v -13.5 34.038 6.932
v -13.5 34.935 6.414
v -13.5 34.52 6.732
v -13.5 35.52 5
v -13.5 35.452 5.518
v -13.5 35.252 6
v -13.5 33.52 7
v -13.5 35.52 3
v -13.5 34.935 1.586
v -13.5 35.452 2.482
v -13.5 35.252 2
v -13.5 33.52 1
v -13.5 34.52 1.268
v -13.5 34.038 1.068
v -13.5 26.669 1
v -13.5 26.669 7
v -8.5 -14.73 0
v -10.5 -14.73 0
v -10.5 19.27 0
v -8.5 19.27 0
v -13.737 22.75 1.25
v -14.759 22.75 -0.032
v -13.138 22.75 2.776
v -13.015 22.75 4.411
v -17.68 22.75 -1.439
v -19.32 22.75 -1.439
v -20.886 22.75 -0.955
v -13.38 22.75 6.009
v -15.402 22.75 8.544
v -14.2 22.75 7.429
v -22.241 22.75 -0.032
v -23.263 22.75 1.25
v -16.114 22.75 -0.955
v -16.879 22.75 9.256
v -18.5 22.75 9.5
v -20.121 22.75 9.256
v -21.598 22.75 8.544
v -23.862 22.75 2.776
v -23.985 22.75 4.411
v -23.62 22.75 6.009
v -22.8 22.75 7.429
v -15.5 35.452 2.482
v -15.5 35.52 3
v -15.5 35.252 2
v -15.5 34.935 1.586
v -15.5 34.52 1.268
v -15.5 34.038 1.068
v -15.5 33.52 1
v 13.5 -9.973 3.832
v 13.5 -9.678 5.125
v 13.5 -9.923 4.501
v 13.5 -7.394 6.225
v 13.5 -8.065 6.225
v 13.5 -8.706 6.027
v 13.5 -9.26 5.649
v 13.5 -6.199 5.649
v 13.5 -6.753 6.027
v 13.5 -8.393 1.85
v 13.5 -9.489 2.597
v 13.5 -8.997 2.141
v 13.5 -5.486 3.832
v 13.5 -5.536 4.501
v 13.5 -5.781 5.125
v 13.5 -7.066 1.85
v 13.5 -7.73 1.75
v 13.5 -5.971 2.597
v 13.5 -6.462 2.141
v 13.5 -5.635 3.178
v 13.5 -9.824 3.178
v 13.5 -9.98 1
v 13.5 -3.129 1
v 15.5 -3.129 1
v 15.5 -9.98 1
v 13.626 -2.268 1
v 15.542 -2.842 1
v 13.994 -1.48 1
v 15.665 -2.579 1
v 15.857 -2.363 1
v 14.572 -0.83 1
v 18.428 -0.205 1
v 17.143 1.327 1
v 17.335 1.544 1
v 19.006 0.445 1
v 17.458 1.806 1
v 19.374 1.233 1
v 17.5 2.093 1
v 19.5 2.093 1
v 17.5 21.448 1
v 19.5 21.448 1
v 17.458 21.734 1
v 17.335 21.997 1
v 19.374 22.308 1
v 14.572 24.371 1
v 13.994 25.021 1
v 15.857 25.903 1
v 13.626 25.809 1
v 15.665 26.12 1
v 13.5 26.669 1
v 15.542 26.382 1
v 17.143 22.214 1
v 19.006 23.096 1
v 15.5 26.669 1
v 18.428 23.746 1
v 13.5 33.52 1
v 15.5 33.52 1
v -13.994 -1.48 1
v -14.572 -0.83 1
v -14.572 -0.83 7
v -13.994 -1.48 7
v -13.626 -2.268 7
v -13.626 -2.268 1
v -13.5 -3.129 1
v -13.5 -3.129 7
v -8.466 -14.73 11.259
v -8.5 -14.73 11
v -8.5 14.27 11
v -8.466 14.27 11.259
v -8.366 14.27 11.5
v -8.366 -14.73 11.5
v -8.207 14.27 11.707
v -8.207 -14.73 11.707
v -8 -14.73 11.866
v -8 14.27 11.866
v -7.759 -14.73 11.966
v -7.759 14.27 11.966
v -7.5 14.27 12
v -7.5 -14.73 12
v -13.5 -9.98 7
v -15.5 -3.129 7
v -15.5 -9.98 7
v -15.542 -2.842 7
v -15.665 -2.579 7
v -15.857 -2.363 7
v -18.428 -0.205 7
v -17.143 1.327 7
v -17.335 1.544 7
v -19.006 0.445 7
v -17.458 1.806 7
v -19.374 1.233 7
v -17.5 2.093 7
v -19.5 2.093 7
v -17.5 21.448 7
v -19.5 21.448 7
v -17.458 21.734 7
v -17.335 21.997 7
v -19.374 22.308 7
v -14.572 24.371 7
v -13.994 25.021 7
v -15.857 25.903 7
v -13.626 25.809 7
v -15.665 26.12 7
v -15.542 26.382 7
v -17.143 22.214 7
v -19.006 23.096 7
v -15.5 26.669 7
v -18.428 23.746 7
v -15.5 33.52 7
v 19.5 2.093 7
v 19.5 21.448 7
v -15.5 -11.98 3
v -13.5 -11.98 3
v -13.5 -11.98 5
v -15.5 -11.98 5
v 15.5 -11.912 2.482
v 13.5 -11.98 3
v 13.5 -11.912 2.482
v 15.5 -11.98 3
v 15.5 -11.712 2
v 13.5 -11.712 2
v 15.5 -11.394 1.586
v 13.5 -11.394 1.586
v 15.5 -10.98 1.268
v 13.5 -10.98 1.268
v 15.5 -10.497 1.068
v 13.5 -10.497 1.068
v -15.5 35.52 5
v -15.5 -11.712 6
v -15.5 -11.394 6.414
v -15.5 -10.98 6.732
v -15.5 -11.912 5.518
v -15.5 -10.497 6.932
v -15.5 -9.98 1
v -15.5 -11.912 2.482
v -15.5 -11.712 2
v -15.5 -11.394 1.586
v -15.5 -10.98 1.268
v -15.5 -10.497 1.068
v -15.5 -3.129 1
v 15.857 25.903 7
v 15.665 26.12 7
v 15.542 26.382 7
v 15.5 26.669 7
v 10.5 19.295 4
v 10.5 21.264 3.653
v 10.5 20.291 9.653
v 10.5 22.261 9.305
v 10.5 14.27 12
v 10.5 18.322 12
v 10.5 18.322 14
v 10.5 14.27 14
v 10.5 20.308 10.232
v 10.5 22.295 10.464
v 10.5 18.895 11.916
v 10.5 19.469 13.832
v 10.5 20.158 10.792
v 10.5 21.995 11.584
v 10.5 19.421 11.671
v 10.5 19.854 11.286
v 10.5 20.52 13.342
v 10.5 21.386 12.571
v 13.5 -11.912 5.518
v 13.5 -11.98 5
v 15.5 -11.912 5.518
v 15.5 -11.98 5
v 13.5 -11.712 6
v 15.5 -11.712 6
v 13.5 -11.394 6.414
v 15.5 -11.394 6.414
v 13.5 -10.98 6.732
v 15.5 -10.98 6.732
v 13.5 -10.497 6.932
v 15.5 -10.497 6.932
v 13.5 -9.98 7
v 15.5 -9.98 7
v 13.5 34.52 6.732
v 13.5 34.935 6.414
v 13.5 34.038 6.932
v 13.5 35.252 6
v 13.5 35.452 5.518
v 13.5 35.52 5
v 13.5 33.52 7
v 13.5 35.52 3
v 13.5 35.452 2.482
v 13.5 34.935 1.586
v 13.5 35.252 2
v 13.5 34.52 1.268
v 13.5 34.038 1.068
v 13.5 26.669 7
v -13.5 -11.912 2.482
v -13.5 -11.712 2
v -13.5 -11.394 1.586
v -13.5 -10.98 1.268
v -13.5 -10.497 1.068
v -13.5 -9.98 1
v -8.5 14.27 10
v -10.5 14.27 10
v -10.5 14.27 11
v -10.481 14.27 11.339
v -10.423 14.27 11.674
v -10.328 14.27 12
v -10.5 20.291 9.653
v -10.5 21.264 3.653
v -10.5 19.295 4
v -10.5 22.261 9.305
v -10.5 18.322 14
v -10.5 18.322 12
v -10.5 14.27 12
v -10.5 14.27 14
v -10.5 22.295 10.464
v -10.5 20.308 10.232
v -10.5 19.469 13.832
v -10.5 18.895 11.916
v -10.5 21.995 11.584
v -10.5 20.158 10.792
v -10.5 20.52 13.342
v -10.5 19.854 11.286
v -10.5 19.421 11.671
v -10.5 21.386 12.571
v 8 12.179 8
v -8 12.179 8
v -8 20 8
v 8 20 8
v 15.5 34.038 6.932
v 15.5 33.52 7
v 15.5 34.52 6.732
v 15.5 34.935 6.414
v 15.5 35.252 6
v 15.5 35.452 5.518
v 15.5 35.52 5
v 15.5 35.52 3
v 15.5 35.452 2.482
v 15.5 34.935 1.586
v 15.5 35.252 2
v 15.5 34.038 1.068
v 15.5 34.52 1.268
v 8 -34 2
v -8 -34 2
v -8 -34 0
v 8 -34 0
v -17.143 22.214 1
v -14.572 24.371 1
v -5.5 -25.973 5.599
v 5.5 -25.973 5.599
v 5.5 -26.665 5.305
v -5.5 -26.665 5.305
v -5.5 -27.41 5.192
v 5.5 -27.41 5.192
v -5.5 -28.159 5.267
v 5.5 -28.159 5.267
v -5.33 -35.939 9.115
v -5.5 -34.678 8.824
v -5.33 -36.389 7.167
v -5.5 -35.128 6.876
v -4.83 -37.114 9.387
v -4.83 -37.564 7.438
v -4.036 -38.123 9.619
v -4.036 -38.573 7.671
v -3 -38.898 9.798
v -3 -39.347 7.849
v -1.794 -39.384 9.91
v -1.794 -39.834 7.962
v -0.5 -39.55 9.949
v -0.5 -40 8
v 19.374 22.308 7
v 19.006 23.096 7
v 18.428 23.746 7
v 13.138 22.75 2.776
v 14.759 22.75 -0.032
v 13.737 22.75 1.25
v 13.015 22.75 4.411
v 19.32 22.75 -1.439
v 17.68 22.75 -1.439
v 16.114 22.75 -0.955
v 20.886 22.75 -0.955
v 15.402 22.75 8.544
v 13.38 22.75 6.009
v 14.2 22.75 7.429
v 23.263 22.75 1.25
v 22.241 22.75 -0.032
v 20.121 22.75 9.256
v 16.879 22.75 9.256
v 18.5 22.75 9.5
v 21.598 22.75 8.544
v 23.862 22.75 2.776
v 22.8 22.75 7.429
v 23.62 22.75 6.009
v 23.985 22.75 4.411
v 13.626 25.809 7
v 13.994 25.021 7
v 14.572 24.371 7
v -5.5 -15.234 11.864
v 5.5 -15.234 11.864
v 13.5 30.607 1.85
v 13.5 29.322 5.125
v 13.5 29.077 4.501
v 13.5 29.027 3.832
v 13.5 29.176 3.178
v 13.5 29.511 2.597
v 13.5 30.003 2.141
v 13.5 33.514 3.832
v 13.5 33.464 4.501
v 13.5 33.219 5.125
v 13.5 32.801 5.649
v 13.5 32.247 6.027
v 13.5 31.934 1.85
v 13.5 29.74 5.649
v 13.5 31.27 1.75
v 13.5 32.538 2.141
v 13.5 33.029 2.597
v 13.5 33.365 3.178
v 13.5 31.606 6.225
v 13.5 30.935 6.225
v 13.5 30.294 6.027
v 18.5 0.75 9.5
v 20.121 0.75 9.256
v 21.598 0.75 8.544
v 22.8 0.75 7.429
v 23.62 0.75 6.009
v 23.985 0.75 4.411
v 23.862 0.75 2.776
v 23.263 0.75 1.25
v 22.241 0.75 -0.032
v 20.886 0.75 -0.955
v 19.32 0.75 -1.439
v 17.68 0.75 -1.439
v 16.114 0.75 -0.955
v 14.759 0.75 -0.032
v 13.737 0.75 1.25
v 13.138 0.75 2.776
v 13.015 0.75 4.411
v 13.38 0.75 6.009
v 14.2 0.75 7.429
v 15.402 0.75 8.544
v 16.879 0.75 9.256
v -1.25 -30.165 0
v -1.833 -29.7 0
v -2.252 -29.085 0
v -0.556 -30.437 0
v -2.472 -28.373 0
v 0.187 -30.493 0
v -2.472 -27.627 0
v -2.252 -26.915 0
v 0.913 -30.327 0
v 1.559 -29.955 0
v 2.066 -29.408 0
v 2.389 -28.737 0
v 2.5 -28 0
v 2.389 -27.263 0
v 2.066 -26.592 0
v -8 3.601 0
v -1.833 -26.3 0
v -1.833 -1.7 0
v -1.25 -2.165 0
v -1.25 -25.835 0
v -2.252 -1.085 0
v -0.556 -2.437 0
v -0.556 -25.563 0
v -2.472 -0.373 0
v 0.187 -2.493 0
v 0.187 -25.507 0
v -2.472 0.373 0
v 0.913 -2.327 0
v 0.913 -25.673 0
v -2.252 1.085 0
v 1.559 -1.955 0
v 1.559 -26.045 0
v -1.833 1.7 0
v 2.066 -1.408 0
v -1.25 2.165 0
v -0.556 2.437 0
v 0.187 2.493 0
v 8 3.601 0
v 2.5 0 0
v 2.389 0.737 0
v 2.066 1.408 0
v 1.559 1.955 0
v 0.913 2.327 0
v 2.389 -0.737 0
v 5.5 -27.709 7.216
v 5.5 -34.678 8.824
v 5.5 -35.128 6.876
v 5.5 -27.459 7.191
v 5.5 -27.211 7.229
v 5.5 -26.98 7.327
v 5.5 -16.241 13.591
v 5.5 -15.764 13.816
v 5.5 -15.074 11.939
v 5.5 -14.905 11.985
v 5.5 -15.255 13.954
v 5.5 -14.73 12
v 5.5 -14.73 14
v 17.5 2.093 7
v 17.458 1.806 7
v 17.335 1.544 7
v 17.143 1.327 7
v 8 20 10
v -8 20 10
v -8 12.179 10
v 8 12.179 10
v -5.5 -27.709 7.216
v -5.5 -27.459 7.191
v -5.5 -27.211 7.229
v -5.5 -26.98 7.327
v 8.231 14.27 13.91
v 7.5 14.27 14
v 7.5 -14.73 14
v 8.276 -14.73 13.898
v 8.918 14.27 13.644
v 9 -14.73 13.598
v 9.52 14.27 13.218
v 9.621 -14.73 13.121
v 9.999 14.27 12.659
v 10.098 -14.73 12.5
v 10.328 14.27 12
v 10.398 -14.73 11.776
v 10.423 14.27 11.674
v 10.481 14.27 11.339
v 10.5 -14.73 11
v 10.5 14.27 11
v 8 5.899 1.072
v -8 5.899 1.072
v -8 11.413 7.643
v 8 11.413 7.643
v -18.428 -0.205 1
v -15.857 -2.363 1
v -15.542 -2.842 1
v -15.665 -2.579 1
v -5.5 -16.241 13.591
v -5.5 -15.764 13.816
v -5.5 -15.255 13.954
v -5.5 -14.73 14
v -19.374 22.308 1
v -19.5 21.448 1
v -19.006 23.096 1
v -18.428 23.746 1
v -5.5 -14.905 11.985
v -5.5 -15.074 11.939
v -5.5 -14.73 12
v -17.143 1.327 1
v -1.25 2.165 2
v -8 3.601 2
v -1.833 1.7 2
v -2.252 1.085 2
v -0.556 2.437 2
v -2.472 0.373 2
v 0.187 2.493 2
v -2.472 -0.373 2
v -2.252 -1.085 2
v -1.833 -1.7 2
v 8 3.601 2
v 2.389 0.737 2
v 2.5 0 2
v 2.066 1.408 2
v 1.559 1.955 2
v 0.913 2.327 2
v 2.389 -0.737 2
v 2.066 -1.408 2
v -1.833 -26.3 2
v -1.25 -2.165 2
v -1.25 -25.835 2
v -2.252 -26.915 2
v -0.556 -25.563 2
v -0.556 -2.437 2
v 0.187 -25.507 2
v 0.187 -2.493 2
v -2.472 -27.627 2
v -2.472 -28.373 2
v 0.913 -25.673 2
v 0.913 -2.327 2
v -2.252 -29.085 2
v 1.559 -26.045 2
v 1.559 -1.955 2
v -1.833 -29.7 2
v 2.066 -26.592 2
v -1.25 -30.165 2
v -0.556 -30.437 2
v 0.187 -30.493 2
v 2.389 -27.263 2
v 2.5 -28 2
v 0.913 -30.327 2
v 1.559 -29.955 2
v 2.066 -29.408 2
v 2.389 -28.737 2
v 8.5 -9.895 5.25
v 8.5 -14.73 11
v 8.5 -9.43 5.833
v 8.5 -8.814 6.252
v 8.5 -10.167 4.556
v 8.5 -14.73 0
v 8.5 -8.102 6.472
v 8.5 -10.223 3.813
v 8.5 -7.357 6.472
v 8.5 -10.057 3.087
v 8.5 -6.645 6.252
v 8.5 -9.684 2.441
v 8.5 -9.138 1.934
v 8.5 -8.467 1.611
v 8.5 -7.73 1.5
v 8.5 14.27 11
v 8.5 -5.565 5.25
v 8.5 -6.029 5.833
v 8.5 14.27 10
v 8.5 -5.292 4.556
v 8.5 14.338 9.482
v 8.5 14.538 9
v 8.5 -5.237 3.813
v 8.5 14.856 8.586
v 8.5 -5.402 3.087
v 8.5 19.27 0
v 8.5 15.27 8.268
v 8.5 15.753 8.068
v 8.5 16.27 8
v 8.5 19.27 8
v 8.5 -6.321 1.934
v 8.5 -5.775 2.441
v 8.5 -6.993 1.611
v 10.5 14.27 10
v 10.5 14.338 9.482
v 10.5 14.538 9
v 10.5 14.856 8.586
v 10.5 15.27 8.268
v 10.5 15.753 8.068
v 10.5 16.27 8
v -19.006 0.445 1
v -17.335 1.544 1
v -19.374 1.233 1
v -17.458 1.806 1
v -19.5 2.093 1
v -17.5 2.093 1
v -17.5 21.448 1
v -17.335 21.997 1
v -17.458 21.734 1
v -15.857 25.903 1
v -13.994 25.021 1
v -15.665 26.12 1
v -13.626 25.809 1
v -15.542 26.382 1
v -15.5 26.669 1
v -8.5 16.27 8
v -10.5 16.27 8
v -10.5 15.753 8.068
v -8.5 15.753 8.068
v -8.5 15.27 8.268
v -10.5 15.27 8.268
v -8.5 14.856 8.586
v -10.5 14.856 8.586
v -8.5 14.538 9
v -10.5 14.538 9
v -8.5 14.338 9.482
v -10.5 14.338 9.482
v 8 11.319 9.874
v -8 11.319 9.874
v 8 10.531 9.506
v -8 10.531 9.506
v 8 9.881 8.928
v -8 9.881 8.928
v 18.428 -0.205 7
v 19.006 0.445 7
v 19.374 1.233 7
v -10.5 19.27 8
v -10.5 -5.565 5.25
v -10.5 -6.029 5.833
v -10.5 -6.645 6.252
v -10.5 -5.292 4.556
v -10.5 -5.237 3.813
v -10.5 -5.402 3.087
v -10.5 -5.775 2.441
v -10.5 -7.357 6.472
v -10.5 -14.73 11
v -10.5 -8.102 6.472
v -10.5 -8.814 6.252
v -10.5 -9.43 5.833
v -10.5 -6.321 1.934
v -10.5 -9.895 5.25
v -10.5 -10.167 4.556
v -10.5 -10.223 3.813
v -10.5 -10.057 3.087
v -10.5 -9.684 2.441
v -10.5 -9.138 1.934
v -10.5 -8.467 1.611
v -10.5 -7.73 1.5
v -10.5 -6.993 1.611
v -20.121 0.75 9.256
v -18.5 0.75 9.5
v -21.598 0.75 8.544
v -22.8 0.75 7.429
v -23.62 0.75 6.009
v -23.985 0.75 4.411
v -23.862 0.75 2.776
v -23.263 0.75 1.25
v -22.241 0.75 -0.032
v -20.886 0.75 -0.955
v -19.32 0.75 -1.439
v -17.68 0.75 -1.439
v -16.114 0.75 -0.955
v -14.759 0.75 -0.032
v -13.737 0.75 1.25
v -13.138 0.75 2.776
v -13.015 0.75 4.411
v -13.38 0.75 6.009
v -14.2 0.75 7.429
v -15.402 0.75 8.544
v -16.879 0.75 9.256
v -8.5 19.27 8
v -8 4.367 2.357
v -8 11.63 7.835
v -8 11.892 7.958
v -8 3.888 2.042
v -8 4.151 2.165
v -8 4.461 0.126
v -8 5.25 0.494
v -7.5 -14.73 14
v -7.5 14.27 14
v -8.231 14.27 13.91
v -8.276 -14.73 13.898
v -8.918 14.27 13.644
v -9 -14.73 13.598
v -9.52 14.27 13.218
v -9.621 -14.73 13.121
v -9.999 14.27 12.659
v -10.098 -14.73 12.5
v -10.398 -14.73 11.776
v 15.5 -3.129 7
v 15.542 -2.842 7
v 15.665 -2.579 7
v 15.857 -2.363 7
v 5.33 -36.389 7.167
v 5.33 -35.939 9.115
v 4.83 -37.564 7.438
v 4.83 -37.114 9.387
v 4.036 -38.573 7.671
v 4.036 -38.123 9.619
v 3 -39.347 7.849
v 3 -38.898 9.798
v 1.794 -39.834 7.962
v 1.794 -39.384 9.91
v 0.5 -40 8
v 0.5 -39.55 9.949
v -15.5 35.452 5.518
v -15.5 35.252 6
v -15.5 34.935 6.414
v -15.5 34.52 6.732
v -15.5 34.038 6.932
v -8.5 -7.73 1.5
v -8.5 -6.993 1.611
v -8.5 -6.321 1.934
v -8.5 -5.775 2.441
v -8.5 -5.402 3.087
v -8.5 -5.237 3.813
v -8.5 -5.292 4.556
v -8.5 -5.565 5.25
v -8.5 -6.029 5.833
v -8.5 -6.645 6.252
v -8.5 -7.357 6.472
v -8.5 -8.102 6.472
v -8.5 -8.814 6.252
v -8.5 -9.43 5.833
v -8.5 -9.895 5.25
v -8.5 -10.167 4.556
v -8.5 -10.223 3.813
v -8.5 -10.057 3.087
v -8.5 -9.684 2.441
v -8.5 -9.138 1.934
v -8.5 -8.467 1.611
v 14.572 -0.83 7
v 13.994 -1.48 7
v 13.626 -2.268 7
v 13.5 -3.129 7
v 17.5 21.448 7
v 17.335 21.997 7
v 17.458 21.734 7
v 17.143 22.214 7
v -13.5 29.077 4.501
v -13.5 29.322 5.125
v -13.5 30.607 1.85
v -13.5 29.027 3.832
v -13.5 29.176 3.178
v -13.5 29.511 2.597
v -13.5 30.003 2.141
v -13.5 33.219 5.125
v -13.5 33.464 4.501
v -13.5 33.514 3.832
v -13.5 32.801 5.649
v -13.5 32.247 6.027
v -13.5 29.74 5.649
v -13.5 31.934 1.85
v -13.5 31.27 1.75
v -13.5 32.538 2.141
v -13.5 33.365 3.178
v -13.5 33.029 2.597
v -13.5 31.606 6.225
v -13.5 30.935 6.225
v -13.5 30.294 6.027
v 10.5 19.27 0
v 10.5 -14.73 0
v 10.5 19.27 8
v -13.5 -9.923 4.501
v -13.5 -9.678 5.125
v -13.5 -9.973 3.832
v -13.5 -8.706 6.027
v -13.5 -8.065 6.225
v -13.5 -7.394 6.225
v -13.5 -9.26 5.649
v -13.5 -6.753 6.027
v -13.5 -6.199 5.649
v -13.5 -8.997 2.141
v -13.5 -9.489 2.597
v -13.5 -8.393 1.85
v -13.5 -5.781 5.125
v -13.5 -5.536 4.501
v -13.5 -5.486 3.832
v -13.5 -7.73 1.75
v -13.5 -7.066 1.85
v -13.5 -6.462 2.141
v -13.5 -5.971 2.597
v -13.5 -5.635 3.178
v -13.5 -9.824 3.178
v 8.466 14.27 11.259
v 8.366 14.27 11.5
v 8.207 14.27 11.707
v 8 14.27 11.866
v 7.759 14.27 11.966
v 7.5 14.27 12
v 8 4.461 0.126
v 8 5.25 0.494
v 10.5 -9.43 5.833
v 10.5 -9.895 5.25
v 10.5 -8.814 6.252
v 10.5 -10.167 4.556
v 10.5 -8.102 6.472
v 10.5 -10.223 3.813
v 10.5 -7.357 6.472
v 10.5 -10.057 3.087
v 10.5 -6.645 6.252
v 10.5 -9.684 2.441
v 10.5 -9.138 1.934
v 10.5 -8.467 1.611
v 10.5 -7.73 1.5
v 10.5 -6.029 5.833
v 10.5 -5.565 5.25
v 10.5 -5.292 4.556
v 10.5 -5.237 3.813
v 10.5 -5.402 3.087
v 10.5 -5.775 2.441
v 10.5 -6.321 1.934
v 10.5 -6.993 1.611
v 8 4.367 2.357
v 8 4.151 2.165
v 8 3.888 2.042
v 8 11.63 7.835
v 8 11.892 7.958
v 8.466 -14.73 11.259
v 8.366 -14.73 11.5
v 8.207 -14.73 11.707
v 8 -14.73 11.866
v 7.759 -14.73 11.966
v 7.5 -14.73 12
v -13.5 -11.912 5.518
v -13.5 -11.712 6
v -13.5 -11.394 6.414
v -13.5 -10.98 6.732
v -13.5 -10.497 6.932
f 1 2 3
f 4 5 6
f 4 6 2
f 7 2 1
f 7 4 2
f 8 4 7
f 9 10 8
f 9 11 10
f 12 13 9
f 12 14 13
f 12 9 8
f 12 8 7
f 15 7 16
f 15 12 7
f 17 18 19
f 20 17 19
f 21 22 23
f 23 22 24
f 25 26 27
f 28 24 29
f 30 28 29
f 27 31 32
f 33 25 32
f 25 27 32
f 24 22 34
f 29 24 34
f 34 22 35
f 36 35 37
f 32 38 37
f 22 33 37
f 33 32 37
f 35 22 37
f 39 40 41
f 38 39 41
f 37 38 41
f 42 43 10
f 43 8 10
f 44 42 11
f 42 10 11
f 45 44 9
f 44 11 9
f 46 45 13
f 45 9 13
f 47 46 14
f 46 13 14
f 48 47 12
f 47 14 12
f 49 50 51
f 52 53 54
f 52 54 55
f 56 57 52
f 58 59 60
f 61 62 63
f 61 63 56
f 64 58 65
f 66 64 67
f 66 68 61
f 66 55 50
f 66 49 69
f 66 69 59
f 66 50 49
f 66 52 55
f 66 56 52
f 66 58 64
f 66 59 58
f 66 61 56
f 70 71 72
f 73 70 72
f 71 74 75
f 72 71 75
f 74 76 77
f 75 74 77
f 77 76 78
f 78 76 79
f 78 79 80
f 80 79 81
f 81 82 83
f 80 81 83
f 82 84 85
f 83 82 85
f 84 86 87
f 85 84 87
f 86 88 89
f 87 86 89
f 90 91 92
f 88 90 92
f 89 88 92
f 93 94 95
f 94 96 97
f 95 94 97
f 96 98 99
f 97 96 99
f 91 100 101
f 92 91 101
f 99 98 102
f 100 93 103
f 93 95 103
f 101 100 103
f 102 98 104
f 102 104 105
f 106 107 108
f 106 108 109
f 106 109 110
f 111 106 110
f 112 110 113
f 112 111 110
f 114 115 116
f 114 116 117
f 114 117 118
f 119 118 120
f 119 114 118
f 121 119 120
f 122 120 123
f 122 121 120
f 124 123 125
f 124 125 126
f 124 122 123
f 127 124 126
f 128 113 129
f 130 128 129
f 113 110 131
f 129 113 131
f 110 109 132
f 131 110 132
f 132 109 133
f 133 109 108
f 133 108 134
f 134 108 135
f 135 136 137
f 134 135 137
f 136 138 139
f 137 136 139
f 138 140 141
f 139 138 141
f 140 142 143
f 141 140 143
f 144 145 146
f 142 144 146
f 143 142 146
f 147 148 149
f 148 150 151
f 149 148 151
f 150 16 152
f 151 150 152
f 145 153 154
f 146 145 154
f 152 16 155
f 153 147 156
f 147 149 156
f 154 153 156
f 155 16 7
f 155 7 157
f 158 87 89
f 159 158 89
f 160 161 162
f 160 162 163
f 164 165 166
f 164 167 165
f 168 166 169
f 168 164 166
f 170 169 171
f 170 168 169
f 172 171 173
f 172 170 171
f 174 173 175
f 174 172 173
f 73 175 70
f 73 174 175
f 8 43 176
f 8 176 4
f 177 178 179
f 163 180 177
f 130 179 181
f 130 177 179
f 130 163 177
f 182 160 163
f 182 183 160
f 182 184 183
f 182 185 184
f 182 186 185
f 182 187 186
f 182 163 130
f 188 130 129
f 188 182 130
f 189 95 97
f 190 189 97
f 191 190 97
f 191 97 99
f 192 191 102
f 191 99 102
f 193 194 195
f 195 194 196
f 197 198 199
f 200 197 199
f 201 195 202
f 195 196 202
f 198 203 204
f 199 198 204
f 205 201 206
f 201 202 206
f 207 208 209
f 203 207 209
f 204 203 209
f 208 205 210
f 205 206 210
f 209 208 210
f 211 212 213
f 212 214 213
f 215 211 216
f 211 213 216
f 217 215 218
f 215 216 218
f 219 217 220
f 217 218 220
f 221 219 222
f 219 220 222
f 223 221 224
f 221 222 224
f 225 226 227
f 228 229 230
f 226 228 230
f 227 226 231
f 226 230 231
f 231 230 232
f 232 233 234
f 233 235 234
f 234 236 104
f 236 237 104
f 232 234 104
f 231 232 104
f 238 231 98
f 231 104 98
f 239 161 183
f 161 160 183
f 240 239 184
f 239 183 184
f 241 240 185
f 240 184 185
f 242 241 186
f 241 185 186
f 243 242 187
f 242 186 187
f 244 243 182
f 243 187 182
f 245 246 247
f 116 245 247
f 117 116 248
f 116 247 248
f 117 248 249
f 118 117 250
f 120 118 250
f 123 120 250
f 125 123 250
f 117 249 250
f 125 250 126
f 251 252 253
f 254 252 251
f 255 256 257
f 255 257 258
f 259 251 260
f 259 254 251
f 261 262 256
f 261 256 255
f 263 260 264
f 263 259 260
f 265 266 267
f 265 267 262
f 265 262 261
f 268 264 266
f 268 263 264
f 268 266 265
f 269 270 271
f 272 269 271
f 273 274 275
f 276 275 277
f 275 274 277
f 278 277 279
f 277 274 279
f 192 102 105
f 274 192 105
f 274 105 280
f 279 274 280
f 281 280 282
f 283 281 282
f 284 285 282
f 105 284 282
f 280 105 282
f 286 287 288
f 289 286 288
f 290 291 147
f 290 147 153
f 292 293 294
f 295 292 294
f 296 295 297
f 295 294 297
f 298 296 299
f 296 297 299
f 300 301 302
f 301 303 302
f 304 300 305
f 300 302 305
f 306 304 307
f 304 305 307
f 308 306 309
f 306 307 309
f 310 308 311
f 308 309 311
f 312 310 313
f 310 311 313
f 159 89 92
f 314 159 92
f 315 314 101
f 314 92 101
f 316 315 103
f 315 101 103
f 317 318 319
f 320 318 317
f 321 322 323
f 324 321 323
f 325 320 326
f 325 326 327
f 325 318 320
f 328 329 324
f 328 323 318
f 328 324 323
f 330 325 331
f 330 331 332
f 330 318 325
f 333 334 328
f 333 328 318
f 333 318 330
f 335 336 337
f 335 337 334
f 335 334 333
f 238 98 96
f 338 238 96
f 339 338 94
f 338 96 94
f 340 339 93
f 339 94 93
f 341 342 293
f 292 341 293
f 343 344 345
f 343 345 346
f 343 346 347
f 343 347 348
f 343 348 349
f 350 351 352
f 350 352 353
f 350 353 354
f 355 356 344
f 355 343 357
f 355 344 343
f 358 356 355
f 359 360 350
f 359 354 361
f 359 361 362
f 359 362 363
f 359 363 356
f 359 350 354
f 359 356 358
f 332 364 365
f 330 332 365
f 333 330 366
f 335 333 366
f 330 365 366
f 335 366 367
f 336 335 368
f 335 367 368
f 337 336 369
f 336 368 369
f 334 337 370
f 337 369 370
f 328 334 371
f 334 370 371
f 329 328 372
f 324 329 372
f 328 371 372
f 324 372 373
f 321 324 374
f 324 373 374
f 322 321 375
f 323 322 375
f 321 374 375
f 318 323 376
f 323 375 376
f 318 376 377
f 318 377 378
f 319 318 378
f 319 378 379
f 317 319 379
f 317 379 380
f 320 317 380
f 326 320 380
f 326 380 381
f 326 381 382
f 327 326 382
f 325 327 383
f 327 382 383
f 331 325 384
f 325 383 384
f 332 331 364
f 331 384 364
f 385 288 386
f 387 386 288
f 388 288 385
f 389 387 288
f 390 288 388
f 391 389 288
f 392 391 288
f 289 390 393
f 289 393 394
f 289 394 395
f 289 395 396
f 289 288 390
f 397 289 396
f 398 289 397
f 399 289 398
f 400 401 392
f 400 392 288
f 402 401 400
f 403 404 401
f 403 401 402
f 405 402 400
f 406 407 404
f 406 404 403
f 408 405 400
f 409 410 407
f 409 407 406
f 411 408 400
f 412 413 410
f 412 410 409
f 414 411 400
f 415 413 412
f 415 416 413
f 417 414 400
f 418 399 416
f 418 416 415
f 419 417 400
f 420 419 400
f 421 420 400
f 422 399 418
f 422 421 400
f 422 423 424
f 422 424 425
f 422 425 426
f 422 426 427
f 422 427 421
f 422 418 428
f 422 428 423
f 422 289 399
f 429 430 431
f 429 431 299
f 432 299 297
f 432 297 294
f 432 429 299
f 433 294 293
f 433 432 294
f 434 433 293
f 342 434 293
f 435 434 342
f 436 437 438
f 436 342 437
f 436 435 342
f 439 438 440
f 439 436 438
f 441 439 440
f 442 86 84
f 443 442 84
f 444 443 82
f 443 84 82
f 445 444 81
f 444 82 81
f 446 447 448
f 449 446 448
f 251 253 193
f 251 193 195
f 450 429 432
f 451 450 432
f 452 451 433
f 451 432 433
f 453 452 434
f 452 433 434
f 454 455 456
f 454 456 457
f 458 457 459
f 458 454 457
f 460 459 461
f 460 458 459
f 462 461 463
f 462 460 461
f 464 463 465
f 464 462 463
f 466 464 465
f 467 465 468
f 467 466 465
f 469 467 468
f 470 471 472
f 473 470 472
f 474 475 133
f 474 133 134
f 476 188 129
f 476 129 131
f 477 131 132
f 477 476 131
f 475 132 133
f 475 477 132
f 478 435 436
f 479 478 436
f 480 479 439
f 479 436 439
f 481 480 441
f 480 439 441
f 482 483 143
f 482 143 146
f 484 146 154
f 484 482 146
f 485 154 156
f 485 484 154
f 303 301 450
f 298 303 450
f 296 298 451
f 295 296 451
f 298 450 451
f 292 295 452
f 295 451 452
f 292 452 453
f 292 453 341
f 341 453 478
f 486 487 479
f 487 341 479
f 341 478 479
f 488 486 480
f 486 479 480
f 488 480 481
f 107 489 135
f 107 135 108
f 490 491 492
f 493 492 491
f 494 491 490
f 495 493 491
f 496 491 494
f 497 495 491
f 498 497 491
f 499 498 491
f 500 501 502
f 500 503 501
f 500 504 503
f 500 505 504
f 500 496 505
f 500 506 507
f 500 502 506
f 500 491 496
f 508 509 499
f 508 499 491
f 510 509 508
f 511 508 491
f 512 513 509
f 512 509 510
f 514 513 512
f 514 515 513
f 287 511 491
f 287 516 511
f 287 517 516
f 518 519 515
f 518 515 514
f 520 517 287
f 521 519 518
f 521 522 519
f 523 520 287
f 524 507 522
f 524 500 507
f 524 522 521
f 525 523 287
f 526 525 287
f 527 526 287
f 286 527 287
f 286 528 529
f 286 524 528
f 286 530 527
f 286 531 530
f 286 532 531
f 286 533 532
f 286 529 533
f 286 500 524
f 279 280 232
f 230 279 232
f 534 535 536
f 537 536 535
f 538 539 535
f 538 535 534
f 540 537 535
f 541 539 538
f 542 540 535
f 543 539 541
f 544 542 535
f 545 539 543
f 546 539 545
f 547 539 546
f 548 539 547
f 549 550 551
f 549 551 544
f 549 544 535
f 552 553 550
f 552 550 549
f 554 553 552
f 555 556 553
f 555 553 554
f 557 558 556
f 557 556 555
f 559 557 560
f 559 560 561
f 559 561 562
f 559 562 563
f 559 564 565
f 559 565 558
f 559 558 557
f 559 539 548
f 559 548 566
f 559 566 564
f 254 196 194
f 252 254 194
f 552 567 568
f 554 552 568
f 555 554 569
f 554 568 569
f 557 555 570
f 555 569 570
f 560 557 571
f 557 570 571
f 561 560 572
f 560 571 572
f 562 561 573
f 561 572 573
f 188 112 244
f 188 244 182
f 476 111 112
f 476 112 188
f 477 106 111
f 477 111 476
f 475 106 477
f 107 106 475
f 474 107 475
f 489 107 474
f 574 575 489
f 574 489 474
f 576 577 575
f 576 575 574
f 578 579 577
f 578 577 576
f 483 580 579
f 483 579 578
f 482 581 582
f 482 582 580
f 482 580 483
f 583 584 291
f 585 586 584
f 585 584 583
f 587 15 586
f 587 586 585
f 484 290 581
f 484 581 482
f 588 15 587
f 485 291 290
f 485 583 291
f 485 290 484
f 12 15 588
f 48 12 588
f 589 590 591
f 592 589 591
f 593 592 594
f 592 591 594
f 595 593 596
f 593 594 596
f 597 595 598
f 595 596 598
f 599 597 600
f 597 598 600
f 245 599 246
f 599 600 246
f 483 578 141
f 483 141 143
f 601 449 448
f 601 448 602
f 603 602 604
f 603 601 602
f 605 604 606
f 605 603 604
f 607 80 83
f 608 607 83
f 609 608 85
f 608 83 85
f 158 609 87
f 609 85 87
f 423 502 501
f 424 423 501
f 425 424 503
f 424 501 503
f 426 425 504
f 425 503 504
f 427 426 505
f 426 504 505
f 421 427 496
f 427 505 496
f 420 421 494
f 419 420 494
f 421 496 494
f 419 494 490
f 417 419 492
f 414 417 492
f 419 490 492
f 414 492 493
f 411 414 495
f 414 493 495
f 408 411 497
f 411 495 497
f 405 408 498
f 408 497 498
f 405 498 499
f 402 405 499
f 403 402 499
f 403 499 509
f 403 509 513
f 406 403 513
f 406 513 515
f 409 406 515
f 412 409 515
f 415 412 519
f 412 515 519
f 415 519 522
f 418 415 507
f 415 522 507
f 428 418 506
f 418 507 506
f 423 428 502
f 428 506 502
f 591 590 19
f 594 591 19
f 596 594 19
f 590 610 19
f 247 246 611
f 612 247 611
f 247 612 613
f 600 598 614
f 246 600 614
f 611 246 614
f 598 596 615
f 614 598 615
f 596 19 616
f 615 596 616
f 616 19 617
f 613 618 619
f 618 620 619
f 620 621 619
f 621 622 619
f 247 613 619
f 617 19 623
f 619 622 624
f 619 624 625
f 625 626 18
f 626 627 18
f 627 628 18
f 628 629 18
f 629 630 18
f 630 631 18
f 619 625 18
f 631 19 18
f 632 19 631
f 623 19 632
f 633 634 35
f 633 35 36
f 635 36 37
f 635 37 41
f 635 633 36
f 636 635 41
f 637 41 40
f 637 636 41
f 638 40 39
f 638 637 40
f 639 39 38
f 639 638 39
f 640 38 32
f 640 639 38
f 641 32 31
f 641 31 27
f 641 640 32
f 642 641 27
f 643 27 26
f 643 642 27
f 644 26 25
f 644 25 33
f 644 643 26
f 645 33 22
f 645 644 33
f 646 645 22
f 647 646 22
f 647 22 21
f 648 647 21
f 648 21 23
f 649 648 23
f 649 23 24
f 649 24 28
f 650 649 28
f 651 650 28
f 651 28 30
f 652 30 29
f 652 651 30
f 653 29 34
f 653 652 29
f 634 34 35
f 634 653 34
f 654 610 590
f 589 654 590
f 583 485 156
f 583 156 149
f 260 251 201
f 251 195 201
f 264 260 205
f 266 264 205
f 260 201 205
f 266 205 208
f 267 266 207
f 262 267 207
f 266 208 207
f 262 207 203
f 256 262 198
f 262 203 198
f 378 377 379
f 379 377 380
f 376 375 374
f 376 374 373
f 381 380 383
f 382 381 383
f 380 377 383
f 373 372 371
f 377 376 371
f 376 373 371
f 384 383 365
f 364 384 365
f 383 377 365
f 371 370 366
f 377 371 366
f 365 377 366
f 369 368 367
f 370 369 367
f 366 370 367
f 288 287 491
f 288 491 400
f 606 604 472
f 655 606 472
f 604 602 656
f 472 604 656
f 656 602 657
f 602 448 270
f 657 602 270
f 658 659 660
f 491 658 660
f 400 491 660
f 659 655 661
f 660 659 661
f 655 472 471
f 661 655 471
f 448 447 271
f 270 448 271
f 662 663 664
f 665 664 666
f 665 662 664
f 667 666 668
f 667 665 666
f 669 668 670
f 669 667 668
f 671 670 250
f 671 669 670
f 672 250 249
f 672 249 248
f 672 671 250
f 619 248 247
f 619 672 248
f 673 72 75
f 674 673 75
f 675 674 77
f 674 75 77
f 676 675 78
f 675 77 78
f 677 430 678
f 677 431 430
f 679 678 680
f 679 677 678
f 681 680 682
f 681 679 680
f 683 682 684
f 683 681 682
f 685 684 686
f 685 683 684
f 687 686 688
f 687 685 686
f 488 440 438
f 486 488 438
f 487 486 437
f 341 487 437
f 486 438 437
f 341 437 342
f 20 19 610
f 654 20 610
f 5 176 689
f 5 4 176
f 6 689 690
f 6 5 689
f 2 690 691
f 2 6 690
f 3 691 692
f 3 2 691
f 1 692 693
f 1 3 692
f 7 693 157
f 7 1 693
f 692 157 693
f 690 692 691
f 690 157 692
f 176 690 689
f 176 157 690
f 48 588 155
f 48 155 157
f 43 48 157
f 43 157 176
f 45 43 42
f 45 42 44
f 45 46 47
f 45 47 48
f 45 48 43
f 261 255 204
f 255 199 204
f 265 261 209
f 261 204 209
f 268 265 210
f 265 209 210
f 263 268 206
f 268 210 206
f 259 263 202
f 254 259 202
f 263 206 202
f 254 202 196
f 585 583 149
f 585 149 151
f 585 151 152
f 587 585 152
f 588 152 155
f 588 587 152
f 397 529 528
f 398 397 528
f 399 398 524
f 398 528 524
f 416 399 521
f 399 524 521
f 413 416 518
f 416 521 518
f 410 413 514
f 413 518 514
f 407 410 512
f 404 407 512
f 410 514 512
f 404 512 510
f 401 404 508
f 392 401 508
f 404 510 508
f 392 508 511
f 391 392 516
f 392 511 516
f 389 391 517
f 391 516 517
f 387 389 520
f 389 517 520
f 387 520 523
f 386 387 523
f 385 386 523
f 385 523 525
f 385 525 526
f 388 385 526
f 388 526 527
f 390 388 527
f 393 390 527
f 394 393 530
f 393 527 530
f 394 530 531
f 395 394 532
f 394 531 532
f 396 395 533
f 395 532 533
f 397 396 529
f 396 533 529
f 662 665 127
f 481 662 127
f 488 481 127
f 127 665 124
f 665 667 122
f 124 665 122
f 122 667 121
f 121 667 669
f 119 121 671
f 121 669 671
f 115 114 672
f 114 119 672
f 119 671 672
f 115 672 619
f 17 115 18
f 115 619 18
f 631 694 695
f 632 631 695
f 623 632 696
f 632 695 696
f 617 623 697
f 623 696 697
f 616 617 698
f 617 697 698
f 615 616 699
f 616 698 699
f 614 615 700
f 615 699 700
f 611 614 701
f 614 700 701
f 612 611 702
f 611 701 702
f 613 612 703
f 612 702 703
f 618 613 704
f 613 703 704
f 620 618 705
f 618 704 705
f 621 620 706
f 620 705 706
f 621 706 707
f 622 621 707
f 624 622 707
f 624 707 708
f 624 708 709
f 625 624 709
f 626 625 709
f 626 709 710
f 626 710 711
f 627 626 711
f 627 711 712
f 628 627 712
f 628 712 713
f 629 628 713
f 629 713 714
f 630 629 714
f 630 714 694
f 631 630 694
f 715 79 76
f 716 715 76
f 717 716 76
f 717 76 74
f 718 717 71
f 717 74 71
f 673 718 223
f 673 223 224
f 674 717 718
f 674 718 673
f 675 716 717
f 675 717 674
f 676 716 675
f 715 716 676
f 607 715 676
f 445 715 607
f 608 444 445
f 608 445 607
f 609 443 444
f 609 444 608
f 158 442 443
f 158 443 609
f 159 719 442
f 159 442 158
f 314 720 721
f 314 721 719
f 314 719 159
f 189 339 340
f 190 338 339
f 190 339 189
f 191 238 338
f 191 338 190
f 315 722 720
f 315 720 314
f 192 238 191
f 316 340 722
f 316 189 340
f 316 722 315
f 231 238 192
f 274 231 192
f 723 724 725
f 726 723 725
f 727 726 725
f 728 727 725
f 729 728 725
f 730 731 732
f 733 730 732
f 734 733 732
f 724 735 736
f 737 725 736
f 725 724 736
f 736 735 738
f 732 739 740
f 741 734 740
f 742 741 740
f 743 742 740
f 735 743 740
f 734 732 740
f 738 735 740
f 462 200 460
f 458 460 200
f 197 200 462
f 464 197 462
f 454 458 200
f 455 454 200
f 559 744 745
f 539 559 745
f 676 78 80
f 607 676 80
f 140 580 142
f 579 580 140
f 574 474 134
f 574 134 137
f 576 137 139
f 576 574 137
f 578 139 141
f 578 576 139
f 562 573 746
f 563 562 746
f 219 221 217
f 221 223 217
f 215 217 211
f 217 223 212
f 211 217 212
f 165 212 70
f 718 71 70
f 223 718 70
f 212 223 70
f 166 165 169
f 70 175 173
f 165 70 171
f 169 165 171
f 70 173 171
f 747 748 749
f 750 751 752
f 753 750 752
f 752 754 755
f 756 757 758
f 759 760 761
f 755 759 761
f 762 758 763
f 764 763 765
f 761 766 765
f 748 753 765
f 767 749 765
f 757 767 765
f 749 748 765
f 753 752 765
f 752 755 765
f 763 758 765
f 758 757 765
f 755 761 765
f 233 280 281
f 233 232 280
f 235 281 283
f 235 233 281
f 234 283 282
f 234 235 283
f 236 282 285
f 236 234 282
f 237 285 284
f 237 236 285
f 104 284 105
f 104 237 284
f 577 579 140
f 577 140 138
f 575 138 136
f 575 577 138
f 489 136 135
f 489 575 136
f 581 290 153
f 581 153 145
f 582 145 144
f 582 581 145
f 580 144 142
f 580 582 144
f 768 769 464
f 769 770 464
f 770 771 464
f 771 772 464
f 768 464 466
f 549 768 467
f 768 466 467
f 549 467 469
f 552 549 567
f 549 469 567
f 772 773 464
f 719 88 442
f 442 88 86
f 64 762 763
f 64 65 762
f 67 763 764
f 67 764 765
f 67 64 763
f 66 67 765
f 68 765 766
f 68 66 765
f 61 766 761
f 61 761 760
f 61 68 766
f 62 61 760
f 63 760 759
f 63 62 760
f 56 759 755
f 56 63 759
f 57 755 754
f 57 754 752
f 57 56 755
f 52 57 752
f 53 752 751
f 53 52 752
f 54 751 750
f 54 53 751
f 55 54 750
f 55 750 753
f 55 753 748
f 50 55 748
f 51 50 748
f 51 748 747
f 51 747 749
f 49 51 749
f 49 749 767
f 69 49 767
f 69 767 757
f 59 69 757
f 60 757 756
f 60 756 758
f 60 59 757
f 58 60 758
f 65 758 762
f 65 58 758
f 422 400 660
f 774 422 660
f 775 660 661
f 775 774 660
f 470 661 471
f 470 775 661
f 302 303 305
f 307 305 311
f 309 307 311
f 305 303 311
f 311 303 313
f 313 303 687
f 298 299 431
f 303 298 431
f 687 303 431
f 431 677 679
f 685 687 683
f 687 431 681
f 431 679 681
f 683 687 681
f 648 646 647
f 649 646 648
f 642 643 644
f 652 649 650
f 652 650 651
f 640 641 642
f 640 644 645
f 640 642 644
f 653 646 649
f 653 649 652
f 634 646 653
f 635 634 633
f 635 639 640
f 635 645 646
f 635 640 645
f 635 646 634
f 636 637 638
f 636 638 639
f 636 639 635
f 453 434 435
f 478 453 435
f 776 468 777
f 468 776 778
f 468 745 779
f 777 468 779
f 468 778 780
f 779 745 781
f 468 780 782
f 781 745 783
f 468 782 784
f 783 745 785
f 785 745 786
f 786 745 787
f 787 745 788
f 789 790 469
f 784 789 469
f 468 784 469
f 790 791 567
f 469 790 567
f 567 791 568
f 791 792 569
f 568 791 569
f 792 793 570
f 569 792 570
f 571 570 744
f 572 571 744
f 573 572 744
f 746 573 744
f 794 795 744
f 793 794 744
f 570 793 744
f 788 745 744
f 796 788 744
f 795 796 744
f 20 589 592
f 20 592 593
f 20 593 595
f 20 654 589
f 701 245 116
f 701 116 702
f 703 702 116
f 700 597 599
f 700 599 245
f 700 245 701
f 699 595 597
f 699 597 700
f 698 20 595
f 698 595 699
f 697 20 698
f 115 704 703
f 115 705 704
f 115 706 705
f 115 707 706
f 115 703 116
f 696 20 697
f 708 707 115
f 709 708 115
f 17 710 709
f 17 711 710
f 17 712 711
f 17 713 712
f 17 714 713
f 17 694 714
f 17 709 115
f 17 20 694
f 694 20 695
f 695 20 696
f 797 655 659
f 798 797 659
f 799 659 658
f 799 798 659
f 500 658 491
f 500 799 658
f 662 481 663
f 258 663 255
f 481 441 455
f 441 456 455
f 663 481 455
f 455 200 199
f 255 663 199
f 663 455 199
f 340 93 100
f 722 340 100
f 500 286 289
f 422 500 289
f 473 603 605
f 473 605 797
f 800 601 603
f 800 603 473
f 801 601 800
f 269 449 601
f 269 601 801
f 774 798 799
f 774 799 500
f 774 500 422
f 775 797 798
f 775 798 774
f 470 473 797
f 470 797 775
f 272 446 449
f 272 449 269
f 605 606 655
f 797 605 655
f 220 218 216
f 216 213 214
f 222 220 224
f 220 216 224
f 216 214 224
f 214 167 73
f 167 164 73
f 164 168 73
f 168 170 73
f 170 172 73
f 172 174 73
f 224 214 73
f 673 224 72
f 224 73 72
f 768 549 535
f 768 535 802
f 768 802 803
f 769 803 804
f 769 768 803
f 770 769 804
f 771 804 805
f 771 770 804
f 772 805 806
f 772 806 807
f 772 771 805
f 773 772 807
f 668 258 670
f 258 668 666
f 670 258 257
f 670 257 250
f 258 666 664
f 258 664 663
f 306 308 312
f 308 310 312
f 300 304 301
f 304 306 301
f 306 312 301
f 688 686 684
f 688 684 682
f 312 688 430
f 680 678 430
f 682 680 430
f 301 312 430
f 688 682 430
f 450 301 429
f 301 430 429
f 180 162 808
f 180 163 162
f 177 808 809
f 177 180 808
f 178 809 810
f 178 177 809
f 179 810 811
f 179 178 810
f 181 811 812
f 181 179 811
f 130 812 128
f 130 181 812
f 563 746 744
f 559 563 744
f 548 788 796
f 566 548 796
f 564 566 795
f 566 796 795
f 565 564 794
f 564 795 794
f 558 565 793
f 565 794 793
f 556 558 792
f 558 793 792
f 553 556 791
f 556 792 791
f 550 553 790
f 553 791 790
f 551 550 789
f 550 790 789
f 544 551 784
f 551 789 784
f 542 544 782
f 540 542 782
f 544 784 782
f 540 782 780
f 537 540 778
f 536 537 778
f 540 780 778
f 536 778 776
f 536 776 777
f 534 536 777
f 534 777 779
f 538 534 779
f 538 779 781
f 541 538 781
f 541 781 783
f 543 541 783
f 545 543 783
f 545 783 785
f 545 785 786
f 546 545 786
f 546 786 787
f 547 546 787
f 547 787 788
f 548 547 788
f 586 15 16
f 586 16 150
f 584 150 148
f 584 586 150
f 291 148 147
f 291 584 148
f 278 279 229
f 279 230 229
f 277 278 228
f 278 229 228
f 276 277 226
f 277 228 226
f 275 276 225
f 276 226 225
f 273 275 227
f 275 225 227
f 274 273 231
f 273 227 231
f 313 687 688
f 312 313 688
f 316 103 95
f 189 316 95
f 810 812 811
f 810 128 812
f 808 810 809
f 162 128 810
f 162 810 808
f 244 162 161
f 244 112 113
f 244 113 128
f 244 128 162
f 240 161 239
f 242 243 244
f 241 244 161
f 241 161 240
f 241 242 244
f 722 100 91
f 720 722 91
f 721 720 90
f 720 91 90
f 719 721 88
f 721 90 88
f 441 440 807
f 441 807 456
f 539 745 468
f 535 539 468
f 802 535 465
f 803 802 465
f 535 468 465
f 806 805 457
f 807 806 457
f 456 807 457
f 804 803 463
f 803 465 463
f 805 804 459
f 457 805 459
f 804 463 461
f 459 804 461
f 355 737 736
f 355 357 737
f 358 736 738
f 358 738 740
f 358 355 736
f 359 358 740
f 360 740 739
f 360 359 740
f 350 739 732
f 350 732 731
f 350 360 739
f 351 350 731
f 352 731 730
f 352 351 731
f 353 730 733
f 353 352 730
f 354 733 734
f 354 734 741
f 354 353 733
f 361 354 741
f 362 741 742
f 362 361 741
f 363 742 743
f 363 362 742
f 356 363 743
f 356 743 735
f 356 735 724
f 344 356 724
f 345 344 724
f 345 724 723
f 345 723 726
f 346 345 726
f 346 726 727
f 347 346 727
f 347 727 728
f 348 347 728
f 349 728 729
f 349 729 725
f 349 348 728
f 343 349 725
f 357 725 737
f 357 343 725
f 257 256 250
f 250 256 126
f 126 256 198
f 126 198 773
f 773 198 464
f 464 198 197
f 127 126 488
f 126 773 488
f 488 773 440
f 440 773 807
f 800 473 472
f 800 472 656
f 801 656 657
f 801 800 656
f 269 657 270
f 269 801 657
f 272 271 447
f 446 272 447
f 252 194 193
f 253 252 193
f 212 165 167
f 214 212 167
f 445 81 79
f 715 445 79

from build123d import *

# Parameters (mm, degrees)
T_LE_DE_BASE_PLI_E1_DEPTH               = 8
ESQUISSE6_R                             = 2.5
ENL_V_MAT_EXTRU_1_DEPTH                 = 2
T_LE_DE_BASE_PLI_E2_DEPTH               = 10.5
ESQUISSE10_W                            = 5
ESQUISSE10_H                            = 25.270349141
ENL_V_MAT_EXTRU_2_DEPTH                 = 44.660622991
T_LE_PLI_E_SUR_AR_TE1_STRIP_W           = 10
T_LE_PLI_E_SUR_AR_TE1_STRIP_H           = 2
T_LE_PLI_E_SUR_AR_TE1_STRIP_CUT_DEPTH   = 29
T_LE_PLI_E_SUR_AR_TE1_STRIP_2_W         = 10
T_LE_PLI_E_SUR_AR_TE1_STRIP_2_H         = 2
T_LE_PLI_E_SUR_AR_TE1_STRIP_CUT_2_DEPTH = 29
T_LE_PLI_E_SUR_AR_TE1_DEPTH             = 29
T_LE_PLI_E_SUR_AR_TE1_FLAT_DEPTH        = 2
T_LE_PLI_E_SUR_AR_TE1_BEND_DEPTH        = 29
T_LE_PLI_E_SUR_AR_TE1_FLAT_2_DEPTH      = 2
CONG_1_R                                = 5
ESQUISSE17_R                            = 2.5
ENL_V_MAT_EXTRU_3_DEPTH                 = 48.296934362
ESQUISSE18_R                            = 2.25
BOSS_EXTRU_1_DEPTH                      = 13.5
BOSS_EXTRU_1_2_DEPTH                    = 13.5
T_LE_DE_BASE_PLI_E3_DEPTH               = 6
CONG_2_R                                = 2
BOSS_EXTRU_2_START                      = 0.75
ESQUISSE24_R                            = 5.5
BOSS_EXTRU_2_DEPTH                      = 22


# Sheet-metal steps are written as plain solids
with BuildPart() as part:
    # Esquisse1 → Tôle de base pliée1 (new, symmetric)
    with BuildSketch(Plane(origin=(0, 0, 0), x_dir=(0, 0, -1), z_dir=(1, 0, 0))):
        with BuildLine():
            Line((0, -34), (0, 3.601077026))
            ThreePointArc((0, 3.601077026), (-0.281076639, 4.868931811), (-1.071637171, 5.899210355))
            Line((-1.071637171, 5.899210355), (-7.64278761, 11.413060264))
            ThreePointArc((-7.64278761, 11.413060264), (-7.906307787, 11.756486446), (-8, 12.179104708))
            Line((-8, 12.179104708), (-8, 20))
            Line((-8, 20), (-10, 20))
            Line((-10, 20), (-10, 12.179104708))
            ThreePointArc((-10, 12.179104708), (-9.718923361, 10.911249922), (-8.928362829, 9.880971378))
            Line((-8.928362829, 9.880971378), (-2.35721239, 4.367121469))
            ThreePointArc((-2.35721239, 4.367121469), (-2.093692213, 4.023695287), (-2, 3.601077026))
            Line((-2, 3.601077026), (-2, -34))
            Line((-2, -34), (0, -34))
        make_face()
    extrude(amount=T_LE_DE_BASE_PLI_E1_DEPTH, both=True)

    # Esquisse6 → Enlèv. mat.-Extru.1 (cut)
    with BuildSketch(Plane.XY.offset(2)):
        Circle(ESQUISSE6_R)
        with Locations((0, -28)):
            Circle(ESQUISSE6_R)
    extrude(amount=-ENL_V_MAT_EXTRU_1_DEPTH, mode=Mode.SUBTRACT)


with BuildPart() as body_2:
    # Esquisse7 → Tôle de base pliée2 (new, symmetric)
    with BuildSketch(Plane(origin=(0, 0, 0), x_dir=(0, 0, -1), z_dir=(1, 0, 0))):
        with BuildLine():
            Line((-4, 19.294692077), (-9.652703645, 20.291416244))
            ThreePointArc((-9.652703645, 20.291416244), (-11.285575219, 19.853889624), (-12, 18.321800738))
            Line((-12, 18.321800738), (-12, -14.729650859))
            ThreePointArc((-12, -14.729650859), (-11.965344213, -14.990630838), (-11.863778901, -15.233521884))
            Line((-11.863778901, -15.233521884), (-5.599269134, -25.972681485))
            ThreePointArc((-5.599269134, -25.972681485), (-5.224579141, -27.03408834), (-5.26743225, -28.158873081))
            Line((-5.26743225, -28.158873081), (-8, -40))
            Line((-8, -40), (-9.948782391, -39.550280987))
            Line((-9.948782391, -39.550280987), (-7.216214641, -27.709154068))
            ThreePointArc((-7.216214641, -27.709154068), (-7.201930271, -27.334225821), (-7.326826936, -26.980423536))
            Line((-7.326826936, -26.980423536), (-13.591336703, -16.241263935))
            ThreePointArc((-13.591336703, -16.241263935), (-13.89603264, -15.512590796), (-14, -14.729650859))
            Line((-14, -14.729650859), (-14, 18.321800738))
            ThreePointArc((-14, 18.321800738), (-12.571150439, 21.38597851), (-9.305407289, 22.26103175))
            Line((-9.305407289, 22.26103175), (-3.652703645, 21.264307583))
            Line((-3.652703645, 21.264307583), (-4, 19.294692077))
        make_face()
    extrude(amount=T_LE_DE_BASE_PLI_E2_DEPTH, both=True)

    # Esquisse10 → Enlèv. mat.-Extru.2 (cut, through all)
    with BuildSketch(Plane.XY.offset(14)):
        with Locations((-8, -27.36482543)):
            Rectangle(ESQUISSE10_W, ESQUISSE10_H)
        with Locations((8, -27.36482543)):
            Rectangle(ESQUISSE10_W, ESQUISSE10_H)
    extrude(amount=-ENL_V_MAT_EXTRU_2_DEPTH, mode=Mode.SUBTRACT)

    # Tôle pliée sur arête1 strip (across the edge) → Tôle pliée sur arête1 strip cut (cut)
    with BuildSketch(Plane(origin=(10.5, 14.270349141, 12), x_dir=(-1, 0, 0), z_dir=(0, -1, 0))):
        with Locations((-2, -1)):
            Rectangle(T_LE_PLI_E_SUR_AR_TE1_STRIP_W, T_LE_PLI_E_SUR_AR_TE1_STRIP_H)
    extrude(amount=T_LE_PLI_E_SUR_AR_TE1_STRIP_CUT_DEPTH, mode=Mode.SUBTRACT)

    # Tôle pliée sur arête1 strip 2 (across the edge) → Tôle pliée sur arête1 strip cut 2 (cut)
    with BuildSketch(Plane(origin=(-10.5, -14.729650859, 12), x_dir=(1, 0, 0), z_dir=(0, 1, 0))):
        with Locations((-2, -1)):
            Rectangle(T_LE_PLI_E_SUR_AR_TE1_STRIP_2_W, T_LE_PLI_E_SUR_AR_TE1_STRIP_2_H)
    extrude(amount=T_LE_PLI_E_SUR_AR_TE1_STRIP_CUT_2_DEPTH, mode=Mode.SUBTRACT)

    # Tôle pliée sur arête1 bend section (across the edge) → Tôle pliée sur arête1 (add)
    with BuildSketch(Plane(origin=(10.5, 14.270349141, 12), x_dir=(-1, 0, 0), z_dir=(0, -1, 0))):
        with BuildLine():
            Line((0, 1), (2, 1))
            ThreePointArc((2, 1), (2.292893219, 0.292893219), (3, 0))
            Line((3, 0), (3, -2))
            ThreePointArc((3, -2), (0.878679656, -1.121320344), (0, 1))
        make_face()
    extrude(amount=T_LE_PLI_E_SUR_AR_TE1_DEPTH)

    # Tôle pliée sur arête1 profile (on flange) → Tôle pliée sur arête1 flat (add)
    with BuildSketch(Plane(origin=(10.5, 0, 12), x_dir=(0, 1, 0), z_dir=(-1, 0, 0))):
        with BuildLine():
            ThreePointArc((14.270349141, 2), (14.856135579, 3.414213562), (16.270349141, 4))
            Line((16.270349141, 4), (19.270349141, 4))
            Line((19.270349141, 4), (19.270349141, 12))
            Line((19.270349141, 12), (-14.729650859, 12))
            Line((-14.729650859, 12), (-14.729650859, 1))
            Line((-14.729650859, 1), (14.270349141, 1))
            Line((14.270349141, 1), (14.270349141, 2))
        make_face()
    extrude(amount=T_LE_PLI_E_SUR_AR_TE1_FLAT_DEPTH)

    # Tôle pliée sur arête1 bend section 2 (across the edge) → Tôle pliée sur arête1 bend (add)
    with BuildSketch(Plane(origin=(-10.5, -14.729650859, 12), x_dir=(1, 0, 0), z_dir=(0, 1, 0))):
        with BuildLine():
            Line((0, 1), (2, 1))
            ThreePointArc((2, 1), (2.292893219, 0.292893219), (3, 0))
            Line((3, 0), (3, -2))
            ThreePointArc((3, -2), (0.878679656, -1.121320344), (0, 1))
        make_face()
    extrude(amount=T_LE_PLI_E_SUR_AR_TE1_BEND_DEPTH)

    # Tôle pliée sur arête1 profile 2 (on flange) → Tôle pliée sur arête1 flat 2 (add)
    with BuildSketch(Plane(origin=(-10.5, 0, 12), x_dir=(0, -1, 0), z_dir=(1, 0, 0))):
        with BuildLine():
            ThreePointArc((-16.270349141, 4), (-14.856135579, 3.414213562), (-14.270349141, 2))
            Line((-14.270349141, 2), (-14.270349141, 1))
            Line((-14.270349141, 1), (14.729650859, 1))
            Line((14.729650859, 1), (14.729650859, 12))
            Line((14.729650859, 12), (-19.270349141, 12))
            Line((-19.270349141, 12), (-19.270349141, 4))
            Line((-19.270349141, 4), (-16.270349141, 4))
        make_face()
    extrude(amount=T_LE_PLI_E_SUR_AR_TE1_FLAT_2_DEPTH)

    # Congé1
    cong_1_edges = [body_2.edges().sort_by_distance(p)[0] for p in [
        (-5.5, -39.775140493, 8.974391196),
        (5.5, -39.775140493, 8.974391196),
    ]]
    fillet(cong_1_edges, radius=CONG_1_R)

    # Esquisse17 → Enlèv. mat.-Extru.3 (cut, through all)
    with BuildSketch(Plane(origin=(10.5, 0, 0), x_dir=(0, 0, -1), z_dir=(1, 0, 0))):
        with Locations((-4, -7.729650859)):
            Circle(ESQUISSE17_R)
    extrude(amount=-ENL_V_MAT_EXTRU_3_DEPTH, mode=Mode.SUBTRACT)


with BuildPart() as body_3:
    # Esquisse18 → Boss.-Extru.1 (new, symmetric)
    with BuildSketch(Plane(origin=(0, 0, 0), x_dir=(0, 0, -1), z_dir=(1, 0, 0))):
        with Locations((-4, -7.729650859)):
            Circle(ESQUISSE18_R)
    extrude(amount=BOSS_EXTRU_1_DEPTH, both=True)


with BuildPart() as body_4:
    # Esquisse18 → Boss.-Extru.1 2 (new, symmetric)
    with BuildSketch(Plane(origin=(0, 0, 0), x_dir=(0, 0, -1), z_dir=(1, 0, 0))):
        with Locations((-4, 31.270349141)):
            Circle(ESQUISSE18_R)
    extrude(amount=BOSS_EXTRU_1_2_DEPTH, both=True)


with BuildPart() as body_5:
    # Esquisse21 → Tôle de base pliée3 (new body)
    with BuildSketch(Plane.XY):
        with BuildLine():
            Line((13.5, 35.520349141), (13.5, 26.669272116))
            ThreePointArc((13.5, 26.669272116), (13.781076639, 25.401417331), (14.571637171, 24.371138786))
            Line((14.571637171, 24.371138786), (17.14278761, 22.213687402))
            ThreePointArc((17.14278761, 22.213687402), (17.406307787, 21.87026122), (17.5, 21.447642958))
            Line((17.5, 21.447642958), (17.5, 2.093055324))
            ThreePointArc((17.5, 2.093055324), (17.406307787, 1.670437062), (17.14278761, 1.327010881))
            Line((17.14278761, 1.327010881), (14.571637171, -0.830440504))
            ThreePointArc((14.571637171, -0.830440504), (13.781076639, -1.860719048), (13.5, -3.128573833))
            Line((13.5, -3.128573833), (13.5, -11.979650859))
            Line((13.5, -11.979650859), (15.5, -11.979650859))
            Line((15.5, -11.979650859), (15.5, -3.128573833))
            ThreePointArc((15.5, -3.128573833), (15.593692213, -2.705955571), (15.85721239, -2.36252939))
            Line((15.85721239, -2.36252939), (18.428362829, -0.205078005))
            ThreePointArc((18.428362829, -0.205078005), (19.218923361, 0.825200539), (19.5, 2.093055324))
            Line((19.5, 2.093055324), (19.5, 21.447642958))
            ThreePointArc((19.5, 21.447642958), (19.218923361, 22.715497744), (18.428362829, 23.745776288))
            Line((18.428362829, 23.745776288), (15.85721239, 25.903227673))
            ThreePointArc((15.85721239, 25.903227673), (15.593692213, 26.246653854), (15.5, 26.669272116))
            Line((15.5, 26.669272116), (15.5, 35.520349141))
            Line((15.5, 35.520349141), (13.5, 35.520349141))
        make_face()
    extrude(amount=T_LE_DE_BASE_PLI_E3_DEPTH)


with BuildPart() as body_5_1:
    # Corps-Déplacer/Copier1: moved
    add(body_5.part.moved(Location((0, 0, 1))))

    # Congé2
    cong_2_edges = [body_5_1.edges().sort_by_distance(p)[0] for p in [
        (14.5, 35.520349141, 1),
        (14.5, -11.979650859, 1),
        (14.5, 35.520349141, 7),
        (14.5, -11.979650859, 7),
    ]]
    fillet(cong_2_edges, radius=CONG_2_R)


with BuildPart() as body_6:
    # Esquisse24 → Boss.-Extru.2 (new body)
    with BuildSketch(Plane(origin=(0, 0, 0), x_dir=(1, 0, 0), z_dir=(0, 1, 0)).offset(BOSS_EXTRU_2_START)):
        with Locations(Location((18.5, -4, 0), (0, 0, 270))):
            Circle(ESQUISSE24_R)
    extrude(amount=BOSS_EXTRU_2_DEPTH)


with BuildPart() as body_7:
    # Symétrie1: mirrored copy
    add(body_5_1.part.mirror(Plane(origin=(0, 0, 0), x_dir=(0, 0, 1), z_dir=(1, 0, 0))))


with BuildPart() as body_8:
    # Sym_trie1 2: mirrored copy
    add(body_6.part.mirror(Plane(origin=(0, 0, 0), x_dir=(0, 0, 1), z_dir=(1, 0, 0))))


solid = Compound([part.part, body_2.part, body_3.part, body_4.part, body_5_1.part, body_6.part, body_7.part, body_8.part])
